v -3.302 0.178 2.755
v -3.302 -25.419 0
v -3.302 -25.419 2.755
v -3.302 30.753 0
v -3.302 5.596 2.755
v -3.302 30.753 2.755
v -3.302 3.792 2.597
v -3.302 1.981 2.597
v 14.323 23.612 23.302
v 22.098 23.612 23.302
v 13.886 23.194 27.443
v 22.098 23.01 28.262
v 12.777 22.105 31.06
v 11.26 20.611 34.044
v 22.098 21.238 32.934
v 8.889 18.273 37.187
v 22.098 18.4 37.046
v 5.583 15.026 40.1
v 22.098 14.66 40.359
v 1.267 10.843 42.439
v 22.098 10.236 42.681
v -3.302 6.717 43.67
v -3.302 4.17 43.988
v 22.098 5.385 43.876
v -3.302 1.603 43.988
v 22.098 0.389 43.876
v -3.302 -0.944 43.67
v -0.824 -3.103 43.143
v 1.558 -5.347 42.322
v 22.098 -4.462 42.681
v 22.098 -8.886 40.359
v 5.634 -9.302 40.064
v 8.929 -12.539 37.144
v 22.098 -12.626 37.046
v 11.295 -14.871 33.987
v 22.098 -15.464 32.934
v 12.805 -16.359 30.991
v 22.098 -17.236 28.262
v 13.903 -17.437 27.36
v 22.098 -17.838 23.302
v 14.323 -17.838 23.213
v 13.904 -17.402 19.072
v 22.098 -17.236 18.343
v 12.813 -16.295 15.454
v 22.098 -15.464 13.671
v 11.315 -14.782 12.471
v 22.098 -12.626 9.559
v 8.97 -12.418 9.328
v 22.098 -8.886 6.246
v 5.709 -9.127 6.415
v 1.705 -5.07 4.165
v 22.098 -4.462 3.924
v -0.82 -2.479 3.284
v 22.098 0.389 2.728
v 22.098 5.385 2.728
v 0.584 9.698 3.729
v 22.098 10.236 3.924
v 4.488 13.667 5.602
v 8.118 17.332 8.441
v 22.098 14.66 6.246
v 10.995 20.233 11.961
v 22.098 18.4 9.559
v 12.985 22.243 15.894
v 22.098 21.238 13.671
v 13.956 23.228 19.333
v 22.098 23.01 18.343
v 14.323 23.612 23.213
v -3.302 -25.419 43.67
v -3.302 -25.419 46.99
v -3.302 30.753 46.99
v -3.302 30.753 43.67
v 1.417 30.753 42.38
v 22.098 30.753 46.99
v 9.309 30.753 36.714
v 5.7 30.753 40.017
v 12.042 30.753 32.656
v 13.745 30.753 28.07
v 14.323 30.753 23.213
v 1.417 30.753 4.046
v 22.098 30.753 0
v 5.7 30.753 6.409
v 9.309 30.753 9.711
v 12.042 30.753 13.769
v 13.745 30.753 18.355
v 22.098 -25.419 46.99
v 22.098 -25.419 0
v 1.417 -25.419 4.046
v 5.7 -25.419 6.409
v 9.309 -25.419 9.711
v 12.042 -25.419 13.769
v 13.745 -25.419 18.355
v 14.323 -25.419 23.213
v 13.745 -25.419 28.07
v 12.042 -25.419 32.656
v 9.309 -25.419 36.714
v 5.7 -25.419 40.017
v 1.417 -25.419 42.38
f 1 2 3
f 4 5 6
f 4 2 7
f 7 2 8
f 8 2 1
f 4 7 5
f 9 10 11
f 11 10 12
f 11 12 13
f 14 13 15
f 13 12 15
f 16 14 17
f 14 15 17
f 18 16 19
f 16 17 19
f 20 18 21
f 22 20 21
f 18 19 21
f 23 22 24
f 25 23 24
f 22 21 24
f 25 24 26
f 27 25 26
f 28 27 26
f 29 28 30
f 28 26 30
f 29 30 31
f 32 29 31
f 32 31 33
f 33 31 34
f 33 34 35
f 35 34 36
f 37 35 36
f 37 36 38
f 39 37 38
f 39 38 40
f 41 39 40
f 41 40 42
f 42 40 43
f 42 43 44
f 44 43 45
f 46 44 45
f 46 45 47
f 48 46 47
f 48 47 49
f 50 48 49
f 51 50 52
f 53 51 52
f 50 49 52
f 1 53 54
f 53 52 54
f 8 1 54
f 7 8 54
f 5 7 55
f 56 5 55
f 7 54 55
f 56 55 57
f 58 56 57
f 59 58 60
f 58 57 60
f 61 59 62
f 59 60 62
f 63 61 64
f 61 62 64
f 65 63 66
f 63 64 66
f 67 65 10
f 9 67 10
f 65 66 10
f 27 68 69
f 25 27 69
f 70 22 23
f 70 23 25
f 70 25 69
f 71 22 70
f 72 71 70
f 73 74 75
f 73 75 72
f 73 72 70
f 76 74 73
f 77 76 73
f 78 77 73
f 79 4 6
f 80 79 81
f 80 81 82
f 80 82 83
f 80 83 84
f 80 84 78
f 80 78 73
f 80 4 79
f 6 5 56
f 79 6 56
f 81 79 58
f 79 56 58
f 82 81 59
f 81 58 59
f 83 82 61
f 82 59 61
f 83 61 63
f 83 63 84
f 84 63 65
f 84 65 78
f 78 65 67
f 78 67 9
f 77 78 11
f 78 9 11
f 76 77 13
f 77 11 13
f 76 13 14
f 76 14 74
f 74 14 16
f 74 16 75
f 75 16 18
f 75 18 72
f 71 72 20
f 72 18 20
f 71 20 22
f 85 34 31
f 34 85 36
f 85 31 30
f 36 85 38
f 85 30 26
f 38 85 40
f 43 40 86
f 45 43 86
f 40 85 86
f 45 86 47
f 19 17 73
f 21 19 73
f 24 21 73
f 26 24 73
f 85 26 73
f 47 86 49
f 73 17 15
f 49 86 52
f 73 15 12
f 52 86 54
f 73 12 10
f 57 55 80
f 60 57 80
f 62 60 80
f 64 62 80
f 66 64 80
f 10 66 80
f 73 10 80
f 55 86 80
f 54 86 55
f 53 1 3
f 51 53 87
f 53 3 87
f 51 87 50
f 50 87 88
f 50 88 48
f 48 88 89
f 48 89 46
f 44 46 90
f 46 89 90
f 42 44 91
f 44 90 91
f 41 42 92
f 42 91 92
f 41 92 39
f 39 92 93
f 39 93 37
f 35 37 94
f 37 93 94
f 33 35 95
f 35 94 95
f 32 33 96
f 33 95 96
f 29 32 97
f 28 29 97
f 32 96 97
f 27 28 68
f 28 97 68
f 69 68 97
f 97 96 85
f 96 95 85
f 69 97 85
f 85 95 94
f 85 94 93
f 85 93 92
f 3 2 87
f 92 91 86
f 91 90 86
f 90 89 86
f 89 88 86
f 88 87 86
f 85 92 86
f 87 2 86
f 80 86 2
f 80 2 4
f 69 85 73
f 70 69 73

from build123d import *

# Parameters (mm, degrees)
F0_W      = 70.6123113632
F0_H      = 104.6859696507
F1_DEPTH  = 52.07
F2_R      = 20.6851974424
F3_DEPTH  = 118.618
F4_R      = 20.7250274732
F5_DEPTH  = 93.98
F6_DEPTH  = 21.59
F7_DEPTH  = 26.924
F8_DEPTH  = 13.208
F9_DEPTH  = 5.08
F10_DEPTH = 25.4


with BuildPart() as f1:
    # F0 (on Top) → F1 (new body)
    with BuildSketch(Plane.XY):
        Rectangle(F0_W, F0_H)
    extrude(amount=F1_DEPTH)

    # F2 (on face) → F3 (cut)
    with BuildSketch(Plane.XZ.offset(52.3429848254)):
        with Locations((-6.3621718436, 23.2127420604)):
            Circle(F2_R)
    extrude(amount=-F3_DEPTH, mode=Mode.SUBTRACT)

    # F4 (on face) → F5 (cut)
    with BuildSketch(Plane.YZ.offset(35.3061556816)):
        with Locations((2.8868210502, 23.3023613691)):
            Circle(F4_R)
    extrude(amount=-F5_DEPTH, mode=Mode.SUBTRACT)

    # F6 (cut): a face of the model
    f6_faces = [f1.faces().sort_by_distance(p)[0] for p in [
        (34.4288083492, 52.3429848254, 26.035),
    ]]
    extrude(f6_faces, amount=-F6_DEPTH, mode=Mode.SUBTRACT)

    # F7 (cut): a face of the model
    f7_faces = [f1.faces().sort_by_distance(p)[0] for p in [
        (-34.4288083492, -52.3429848254, 26.035),
    ]]
    extrude(f7_faces, amount=-F7_DEPTH, mode=Mode.SUBTRACT)

    # F8 (cut): a face of the model
    f8_faces = [f1.faces().sort_by_distance(p)[0] for p in [
        (35.3061556816, 2.667, 0.7659357071),
    ]]
    extrude(f8_faces, amount=-F8_DEPTH, mode=Mode.SUBTRACT)

    # F9 (cut): a face of the model
    f9_faces = [f1.faces().sort_by_distance(p)[0] for p in [
        (-6.604, 2.667, 52.07),
    ]]
    extrude(f9_faces, amount=-F9_DEPTH, mode=Mode.SUBTRACT)

    # F10 (intersect): a face of the model
    f10_faces = [f1.faces().sort_by_distance(p)[0] for p in [
        (22.0981556816, 2.667, 0.7323489793),
    ]]
    extrude(f10_faces, amount=-F10_DEPTH, mode=Mode.INTERSECT)


solid = f1.part
